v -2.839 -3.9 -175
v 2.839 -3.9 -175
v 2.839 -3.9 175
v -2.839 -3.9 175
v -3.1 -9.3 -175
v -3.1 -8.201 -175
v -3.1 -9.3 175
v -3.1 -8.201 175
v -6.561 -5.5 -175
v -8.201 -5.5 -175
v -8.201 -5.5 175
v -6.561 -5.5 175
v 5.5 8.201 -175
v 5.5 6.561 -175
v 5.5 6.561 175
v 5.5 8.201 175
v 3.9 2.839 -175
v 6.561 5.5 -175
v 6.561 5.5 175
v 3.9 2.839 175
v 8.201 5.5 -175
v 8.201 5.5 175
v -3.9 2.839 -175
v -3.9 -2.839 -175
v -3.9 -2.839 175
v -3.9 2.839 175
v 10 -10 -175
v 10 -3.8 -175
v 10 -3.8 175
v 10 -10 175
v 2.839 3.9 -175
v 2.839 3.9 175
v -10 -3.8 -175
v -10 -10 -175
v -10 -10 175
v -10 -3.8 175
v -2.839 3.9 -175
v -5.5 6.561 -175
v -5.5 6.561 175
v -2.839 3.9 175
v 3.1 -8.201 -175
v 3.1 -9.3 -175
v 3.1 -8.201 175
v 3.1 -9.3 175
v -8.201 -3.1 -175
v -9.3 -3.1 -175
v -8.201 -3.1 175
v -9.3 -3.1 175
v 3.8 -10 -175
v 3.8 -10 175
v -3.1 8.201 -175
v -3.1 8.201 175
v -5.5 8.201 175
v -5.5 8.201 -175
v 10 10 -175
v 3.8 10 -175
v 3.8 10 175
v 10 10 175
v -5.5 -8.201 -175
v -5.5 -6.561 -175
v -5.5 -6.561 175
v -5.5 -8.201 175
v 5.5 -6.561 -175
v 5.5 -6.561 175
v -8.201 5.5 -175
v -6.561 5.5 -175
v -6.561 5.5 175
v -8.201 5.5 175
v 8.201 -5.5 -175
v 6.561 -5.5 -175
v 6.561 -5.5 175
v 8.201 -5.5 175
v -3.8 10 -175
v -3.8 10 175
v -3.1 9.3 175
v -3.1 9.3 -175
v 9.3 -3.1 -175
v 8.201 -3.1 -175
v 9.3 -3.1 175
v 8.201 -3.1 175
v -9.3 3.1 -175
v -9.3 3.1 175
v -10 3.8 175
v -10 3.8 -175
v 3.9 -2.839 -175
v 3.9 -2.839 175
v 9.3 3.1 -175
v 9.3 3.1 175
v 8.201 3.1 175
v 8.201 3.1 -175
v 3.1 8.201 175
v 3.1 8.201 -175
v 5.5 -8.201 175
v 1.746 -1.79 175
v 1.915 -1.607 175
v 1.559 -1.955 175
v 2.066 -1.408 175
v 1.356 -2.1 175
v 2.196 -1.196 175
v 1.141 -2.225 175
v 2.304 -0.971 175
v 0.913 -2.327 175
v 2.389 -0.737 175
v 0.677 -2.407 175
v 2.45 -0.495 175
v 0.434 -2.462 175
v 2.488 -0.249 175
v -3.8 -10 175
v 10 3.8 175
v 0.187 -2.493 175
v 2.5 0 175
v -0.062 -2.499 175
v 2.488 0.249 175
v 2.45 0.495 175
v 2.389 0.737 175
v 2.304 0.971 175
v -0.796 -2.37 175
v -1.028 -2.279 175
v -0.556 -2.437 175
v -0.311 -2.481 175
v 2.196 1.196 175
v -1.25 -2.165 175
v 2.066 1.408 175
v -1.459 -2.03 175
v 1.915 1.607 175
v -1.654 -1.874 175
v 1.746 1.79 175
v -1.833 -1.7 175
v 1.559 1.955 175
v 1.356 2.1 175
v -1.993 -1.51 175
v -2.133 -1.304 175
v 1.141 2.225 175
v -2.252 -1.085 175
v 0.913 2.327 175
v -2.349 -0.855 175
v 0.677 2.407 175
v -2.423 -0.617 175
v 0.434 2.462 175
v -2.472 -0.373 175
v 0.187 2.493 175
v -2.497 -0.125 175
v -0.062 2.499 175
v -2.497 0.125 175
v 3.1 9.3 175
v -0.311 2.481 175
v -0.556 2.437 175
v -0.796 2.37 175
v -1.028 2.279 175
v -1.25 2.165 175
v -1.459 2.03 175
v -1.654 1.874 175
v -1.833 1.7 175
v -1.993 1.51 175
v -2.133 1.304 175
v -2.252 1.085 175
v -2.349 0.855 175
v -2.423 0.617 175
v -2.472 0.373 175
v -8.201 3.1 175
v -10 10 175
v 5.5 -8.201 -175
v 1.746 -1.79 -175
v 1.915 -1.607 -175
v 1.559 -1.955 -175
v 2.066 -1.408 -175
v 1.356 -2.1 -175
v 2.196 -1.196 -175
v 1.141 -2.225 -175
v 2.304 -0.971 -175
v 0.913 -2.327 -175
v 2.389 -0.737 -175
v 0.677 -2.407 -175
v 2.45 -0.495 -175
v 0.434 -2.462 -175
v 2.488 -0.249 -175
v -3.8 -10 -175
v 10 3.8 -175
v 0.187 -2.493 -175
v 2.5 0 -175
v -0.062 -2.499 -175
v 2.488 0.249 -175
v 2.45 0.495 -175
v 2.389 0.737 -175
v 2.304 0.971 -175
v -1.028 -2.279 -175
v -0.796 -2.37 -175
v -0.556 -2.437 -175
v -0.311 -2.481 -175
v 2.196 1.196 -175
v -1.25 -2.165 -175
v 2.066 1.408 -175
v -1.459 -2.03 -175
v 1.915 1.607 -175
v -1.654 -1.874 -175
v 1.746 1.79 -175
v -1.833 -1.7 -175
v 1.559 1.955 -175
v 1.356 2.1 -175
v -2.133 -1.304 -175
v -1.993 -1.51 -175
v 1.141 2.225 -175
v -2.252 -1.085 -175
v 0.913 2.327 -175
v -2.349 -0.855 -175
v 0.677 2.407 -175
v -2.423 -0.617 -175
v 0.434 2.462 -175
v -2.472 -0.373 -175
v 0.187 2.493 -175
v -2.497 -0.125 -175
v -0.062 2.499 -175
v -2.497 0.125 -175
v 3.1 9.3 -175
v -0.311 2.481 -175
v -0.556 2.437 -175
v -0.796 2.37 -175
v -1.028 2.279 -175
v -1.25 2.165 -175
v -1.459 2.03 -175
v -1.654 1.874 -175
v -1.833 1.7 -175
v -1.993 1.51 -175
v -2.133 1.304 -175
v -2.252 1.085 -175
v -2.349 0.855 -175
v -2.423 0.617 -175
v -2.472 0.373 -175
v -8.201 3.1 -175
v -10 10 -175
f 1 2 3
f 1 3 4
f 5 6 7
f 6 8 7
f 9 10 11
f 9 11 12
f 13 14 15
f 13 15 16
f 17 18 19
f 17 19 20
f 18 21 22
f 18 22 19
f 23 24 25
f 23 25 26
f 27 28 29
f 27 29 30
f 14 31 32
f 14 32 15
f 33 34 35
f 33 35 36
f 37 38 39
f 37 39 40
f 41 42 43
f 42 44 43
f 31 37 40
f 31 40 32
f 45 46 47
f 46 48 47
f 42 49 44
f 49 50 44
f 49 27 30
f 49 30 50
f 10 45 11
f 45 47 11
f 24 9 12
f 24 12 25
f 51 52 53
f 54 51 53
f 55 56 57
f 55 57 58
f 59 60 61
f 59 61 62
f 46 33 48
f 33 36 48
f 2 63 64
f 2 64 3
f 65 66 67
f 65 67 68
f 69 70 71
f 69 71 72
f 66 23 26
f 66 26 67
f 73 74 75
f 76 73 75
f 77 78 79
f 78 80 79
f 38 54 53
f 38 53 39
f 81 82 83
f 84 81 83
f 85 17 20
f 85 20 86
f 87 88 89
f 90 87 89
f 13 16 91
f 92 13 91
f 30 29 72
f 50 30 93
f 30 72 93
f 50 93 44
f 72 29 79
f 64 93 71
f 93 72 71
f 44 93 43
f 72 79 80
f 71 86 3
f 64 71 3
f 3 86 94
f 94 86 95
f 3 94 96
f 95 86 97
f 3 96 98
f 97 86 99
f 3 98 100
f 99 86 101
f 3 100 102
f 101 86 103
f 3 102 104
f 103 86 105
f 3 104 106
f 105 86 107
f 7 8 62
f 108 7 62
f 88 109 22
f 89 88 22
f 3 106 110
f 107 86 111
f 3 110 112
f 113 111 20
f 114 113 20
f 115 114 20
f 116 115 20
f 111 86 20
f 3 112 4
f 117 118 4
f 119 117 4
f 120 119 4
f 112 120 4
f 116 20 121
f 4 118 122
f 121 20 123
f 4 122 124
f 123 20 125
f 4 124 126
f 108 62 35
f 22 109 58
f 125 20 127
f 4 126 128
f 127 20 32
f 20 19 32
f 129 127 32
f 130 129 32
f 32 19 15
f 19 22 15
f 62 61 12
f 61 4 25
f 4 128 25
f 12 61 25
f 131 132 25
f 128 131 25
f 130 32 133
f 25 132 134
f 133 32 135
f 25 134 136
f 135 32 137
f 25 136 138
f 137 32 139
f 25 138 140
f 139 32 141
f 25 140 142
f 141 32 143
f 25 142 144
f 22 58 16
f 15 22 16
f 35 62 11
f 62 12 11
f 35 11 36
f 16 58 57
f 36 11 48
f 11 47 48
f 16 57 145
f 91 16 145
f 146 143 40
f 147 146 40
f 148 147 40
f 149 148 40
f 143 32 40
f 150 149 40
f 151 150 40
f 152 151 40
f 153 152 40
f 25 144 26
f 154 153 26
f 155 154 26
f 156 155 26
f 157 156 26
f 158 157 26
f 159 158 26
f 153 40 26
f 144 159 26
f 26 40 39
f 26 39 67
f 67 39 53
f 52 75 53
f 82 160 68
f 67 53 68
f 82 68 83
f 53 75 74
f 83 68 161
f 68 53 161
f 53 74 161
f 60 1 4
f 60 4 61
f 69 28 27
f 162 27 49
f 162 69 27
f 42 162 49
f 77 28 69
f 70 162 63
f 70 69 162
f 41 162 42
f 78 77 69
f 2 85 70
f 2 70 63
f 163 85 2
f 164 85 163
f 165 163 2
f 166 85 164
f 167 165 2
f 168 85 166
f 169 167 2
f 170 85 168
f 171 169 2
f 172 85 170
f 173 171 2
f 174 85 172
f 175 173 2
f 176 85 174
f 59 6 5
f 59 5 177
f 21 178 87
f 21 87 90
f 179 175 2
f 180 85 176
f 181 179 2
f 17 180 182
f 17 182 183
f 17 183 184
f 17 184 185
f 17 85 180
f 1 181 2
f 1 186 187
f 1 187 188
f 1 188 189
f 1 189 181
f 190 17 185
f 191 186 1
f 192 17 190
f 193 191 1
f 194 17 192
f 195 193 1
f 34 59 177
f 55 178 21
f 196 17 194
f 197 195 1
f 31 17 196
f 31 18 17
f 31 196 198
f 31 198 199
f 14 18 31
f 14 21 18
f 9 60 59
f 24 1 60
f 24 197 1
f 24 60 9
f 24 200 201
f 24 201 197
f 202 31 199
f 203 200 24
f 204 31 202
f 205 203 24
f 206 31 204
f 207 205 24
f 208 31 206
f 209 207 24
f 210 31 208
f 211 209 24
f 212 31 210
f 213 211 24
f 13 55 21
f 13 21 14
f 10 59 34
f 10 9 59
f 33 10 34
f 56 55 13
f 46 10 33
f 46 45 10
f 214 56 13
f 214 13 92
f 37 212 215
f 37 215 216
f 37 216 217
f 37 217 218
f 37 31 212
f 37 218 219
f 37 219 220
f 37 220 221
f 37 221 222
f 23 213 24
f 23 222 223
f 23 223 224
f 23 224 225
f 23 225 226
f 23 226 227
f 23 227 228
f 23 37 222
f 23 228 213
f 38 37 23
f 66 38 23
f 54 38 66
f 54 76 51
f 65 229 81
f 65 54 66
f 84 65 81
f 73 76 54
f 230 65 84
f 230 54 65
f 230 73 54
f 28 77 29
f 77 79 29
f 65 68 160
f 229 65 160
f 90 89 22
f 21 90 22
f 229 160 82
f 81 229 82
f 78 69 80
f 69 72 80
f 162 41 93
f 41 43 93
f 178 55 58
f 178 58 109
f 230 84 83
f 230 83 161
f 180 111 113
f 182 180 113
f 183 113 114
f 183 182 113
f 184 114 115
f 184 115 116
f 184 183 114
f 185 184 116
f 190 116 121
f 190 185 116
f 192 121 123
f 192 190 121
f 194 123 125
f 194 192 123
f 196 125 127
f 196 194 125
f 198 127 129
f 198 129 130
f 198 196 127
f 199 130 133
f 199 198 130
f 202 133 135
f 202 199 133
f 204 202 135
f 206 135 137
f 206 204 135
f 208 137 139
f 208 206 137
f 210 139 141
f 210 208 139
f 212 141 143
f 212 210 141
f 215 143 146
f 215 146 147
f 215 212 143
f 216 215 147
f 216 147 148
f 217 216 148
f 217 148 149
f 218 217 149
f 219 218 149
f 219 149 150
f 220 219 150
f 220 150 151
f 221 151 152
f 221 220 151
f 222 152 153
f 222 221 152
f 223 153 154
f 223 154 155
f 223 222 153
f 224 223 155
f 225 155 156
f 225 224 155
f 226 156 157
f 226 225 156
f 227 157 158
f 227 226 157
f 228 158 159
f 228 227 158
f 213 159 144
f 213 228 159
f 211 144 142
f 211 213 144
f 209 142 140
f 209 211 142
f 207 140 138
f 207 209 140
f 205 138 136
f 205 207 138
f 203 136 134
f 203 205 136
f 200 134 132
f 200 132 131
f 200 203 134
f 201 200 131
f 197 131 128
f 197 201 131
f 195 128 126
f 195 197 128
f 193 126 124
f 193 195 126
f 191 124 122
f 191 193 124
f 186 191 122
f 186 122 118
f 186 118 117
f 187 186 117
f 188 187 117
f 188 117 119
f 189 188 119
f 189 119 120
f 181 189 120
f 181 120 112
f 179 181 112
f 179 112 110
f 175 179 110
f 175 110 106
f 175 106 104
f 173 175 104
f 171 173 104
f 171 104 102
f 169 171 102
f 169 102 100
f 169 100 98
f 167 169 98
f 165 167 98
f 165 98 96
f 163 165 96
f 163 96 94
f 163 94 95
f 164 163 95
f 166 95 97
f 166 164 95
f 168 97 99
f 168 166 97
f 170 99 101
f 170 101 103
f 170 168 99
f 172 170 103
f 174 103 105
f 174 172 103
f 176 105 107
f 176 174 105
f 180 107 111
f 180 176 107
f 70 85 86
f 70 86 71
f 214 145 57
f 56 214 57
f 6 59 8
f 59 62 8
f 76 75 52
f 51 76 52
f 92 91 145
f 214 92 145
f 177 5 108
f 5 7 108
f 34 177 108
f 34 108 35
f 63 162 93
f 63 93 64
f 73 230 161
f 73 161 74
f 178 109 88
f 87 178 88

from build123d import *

# Parameters (mm, degrees)
SKETCH1_R           = 2.5
BOSS_EXTRUDE1_DEPTH = 175


with BuildPart() as part:
    # Sketch1 → Boss-Extrude1 (new, symmetric)
    with BuildSketch(Plane.XY):
        Polygon((3.9, -2.839339828), (6.560660172, -5.5), (8.200660172, -5.5), (8.200660172, -3.1), (9.3, -3.1), (10, -3.8), (10, -10), (3.8, -10), (3.1, -9.3), (3.1, -8.200660172), (5.5, -8.200660172), (5.5, -6.560660172), (2.839339828, -3.9), (-2.839339828, -3.9), (-5.5, -6.560660172), (-5.5, -8.200660172), (-3.1, -8.200660172), (-3.1, -9.3), (-3.8, -10), (-10, -10), (-10, -3.8), (-9.3, -3.1), (-8.200660172, -3.1), (-8.200660172, -5.5), (-6.560660172, -5.5), (-3.9, -2.839339828), (-3.9, 2.839339828), (-6.560660172, 5.5), (-8.200660172, 5.5), (-8.200660172, 3.1), (-9.3, 3.1), (-10, 3.8), (-10, 10), (-3.8, 10), (-3.1, 9.3), (-3.1, 8.200660172), (-5.5, 8.200660172), (-5.5, 6.560660172), (-2.839339828, 3.9), (2.839339828, 3.9), (5.5, 6.560660172), (5.5, 8.200660172), (3.1, 8.200660172), (3.1, 9.3), (3.8, 10), (10, 10), (10, 3.8), (9.3, 3.1), (8.200660172, 3.1), (8.200660172, 5.5), (6.560660172, 5.5), (3.9, 2.839339828), align=None)
        Circle(SKETCH1_R, mode=Mode.SUBTRACT)
    extrude(amount=BOSS_EXTRUDE1_DEPTH, both=True)


solid = part.part
